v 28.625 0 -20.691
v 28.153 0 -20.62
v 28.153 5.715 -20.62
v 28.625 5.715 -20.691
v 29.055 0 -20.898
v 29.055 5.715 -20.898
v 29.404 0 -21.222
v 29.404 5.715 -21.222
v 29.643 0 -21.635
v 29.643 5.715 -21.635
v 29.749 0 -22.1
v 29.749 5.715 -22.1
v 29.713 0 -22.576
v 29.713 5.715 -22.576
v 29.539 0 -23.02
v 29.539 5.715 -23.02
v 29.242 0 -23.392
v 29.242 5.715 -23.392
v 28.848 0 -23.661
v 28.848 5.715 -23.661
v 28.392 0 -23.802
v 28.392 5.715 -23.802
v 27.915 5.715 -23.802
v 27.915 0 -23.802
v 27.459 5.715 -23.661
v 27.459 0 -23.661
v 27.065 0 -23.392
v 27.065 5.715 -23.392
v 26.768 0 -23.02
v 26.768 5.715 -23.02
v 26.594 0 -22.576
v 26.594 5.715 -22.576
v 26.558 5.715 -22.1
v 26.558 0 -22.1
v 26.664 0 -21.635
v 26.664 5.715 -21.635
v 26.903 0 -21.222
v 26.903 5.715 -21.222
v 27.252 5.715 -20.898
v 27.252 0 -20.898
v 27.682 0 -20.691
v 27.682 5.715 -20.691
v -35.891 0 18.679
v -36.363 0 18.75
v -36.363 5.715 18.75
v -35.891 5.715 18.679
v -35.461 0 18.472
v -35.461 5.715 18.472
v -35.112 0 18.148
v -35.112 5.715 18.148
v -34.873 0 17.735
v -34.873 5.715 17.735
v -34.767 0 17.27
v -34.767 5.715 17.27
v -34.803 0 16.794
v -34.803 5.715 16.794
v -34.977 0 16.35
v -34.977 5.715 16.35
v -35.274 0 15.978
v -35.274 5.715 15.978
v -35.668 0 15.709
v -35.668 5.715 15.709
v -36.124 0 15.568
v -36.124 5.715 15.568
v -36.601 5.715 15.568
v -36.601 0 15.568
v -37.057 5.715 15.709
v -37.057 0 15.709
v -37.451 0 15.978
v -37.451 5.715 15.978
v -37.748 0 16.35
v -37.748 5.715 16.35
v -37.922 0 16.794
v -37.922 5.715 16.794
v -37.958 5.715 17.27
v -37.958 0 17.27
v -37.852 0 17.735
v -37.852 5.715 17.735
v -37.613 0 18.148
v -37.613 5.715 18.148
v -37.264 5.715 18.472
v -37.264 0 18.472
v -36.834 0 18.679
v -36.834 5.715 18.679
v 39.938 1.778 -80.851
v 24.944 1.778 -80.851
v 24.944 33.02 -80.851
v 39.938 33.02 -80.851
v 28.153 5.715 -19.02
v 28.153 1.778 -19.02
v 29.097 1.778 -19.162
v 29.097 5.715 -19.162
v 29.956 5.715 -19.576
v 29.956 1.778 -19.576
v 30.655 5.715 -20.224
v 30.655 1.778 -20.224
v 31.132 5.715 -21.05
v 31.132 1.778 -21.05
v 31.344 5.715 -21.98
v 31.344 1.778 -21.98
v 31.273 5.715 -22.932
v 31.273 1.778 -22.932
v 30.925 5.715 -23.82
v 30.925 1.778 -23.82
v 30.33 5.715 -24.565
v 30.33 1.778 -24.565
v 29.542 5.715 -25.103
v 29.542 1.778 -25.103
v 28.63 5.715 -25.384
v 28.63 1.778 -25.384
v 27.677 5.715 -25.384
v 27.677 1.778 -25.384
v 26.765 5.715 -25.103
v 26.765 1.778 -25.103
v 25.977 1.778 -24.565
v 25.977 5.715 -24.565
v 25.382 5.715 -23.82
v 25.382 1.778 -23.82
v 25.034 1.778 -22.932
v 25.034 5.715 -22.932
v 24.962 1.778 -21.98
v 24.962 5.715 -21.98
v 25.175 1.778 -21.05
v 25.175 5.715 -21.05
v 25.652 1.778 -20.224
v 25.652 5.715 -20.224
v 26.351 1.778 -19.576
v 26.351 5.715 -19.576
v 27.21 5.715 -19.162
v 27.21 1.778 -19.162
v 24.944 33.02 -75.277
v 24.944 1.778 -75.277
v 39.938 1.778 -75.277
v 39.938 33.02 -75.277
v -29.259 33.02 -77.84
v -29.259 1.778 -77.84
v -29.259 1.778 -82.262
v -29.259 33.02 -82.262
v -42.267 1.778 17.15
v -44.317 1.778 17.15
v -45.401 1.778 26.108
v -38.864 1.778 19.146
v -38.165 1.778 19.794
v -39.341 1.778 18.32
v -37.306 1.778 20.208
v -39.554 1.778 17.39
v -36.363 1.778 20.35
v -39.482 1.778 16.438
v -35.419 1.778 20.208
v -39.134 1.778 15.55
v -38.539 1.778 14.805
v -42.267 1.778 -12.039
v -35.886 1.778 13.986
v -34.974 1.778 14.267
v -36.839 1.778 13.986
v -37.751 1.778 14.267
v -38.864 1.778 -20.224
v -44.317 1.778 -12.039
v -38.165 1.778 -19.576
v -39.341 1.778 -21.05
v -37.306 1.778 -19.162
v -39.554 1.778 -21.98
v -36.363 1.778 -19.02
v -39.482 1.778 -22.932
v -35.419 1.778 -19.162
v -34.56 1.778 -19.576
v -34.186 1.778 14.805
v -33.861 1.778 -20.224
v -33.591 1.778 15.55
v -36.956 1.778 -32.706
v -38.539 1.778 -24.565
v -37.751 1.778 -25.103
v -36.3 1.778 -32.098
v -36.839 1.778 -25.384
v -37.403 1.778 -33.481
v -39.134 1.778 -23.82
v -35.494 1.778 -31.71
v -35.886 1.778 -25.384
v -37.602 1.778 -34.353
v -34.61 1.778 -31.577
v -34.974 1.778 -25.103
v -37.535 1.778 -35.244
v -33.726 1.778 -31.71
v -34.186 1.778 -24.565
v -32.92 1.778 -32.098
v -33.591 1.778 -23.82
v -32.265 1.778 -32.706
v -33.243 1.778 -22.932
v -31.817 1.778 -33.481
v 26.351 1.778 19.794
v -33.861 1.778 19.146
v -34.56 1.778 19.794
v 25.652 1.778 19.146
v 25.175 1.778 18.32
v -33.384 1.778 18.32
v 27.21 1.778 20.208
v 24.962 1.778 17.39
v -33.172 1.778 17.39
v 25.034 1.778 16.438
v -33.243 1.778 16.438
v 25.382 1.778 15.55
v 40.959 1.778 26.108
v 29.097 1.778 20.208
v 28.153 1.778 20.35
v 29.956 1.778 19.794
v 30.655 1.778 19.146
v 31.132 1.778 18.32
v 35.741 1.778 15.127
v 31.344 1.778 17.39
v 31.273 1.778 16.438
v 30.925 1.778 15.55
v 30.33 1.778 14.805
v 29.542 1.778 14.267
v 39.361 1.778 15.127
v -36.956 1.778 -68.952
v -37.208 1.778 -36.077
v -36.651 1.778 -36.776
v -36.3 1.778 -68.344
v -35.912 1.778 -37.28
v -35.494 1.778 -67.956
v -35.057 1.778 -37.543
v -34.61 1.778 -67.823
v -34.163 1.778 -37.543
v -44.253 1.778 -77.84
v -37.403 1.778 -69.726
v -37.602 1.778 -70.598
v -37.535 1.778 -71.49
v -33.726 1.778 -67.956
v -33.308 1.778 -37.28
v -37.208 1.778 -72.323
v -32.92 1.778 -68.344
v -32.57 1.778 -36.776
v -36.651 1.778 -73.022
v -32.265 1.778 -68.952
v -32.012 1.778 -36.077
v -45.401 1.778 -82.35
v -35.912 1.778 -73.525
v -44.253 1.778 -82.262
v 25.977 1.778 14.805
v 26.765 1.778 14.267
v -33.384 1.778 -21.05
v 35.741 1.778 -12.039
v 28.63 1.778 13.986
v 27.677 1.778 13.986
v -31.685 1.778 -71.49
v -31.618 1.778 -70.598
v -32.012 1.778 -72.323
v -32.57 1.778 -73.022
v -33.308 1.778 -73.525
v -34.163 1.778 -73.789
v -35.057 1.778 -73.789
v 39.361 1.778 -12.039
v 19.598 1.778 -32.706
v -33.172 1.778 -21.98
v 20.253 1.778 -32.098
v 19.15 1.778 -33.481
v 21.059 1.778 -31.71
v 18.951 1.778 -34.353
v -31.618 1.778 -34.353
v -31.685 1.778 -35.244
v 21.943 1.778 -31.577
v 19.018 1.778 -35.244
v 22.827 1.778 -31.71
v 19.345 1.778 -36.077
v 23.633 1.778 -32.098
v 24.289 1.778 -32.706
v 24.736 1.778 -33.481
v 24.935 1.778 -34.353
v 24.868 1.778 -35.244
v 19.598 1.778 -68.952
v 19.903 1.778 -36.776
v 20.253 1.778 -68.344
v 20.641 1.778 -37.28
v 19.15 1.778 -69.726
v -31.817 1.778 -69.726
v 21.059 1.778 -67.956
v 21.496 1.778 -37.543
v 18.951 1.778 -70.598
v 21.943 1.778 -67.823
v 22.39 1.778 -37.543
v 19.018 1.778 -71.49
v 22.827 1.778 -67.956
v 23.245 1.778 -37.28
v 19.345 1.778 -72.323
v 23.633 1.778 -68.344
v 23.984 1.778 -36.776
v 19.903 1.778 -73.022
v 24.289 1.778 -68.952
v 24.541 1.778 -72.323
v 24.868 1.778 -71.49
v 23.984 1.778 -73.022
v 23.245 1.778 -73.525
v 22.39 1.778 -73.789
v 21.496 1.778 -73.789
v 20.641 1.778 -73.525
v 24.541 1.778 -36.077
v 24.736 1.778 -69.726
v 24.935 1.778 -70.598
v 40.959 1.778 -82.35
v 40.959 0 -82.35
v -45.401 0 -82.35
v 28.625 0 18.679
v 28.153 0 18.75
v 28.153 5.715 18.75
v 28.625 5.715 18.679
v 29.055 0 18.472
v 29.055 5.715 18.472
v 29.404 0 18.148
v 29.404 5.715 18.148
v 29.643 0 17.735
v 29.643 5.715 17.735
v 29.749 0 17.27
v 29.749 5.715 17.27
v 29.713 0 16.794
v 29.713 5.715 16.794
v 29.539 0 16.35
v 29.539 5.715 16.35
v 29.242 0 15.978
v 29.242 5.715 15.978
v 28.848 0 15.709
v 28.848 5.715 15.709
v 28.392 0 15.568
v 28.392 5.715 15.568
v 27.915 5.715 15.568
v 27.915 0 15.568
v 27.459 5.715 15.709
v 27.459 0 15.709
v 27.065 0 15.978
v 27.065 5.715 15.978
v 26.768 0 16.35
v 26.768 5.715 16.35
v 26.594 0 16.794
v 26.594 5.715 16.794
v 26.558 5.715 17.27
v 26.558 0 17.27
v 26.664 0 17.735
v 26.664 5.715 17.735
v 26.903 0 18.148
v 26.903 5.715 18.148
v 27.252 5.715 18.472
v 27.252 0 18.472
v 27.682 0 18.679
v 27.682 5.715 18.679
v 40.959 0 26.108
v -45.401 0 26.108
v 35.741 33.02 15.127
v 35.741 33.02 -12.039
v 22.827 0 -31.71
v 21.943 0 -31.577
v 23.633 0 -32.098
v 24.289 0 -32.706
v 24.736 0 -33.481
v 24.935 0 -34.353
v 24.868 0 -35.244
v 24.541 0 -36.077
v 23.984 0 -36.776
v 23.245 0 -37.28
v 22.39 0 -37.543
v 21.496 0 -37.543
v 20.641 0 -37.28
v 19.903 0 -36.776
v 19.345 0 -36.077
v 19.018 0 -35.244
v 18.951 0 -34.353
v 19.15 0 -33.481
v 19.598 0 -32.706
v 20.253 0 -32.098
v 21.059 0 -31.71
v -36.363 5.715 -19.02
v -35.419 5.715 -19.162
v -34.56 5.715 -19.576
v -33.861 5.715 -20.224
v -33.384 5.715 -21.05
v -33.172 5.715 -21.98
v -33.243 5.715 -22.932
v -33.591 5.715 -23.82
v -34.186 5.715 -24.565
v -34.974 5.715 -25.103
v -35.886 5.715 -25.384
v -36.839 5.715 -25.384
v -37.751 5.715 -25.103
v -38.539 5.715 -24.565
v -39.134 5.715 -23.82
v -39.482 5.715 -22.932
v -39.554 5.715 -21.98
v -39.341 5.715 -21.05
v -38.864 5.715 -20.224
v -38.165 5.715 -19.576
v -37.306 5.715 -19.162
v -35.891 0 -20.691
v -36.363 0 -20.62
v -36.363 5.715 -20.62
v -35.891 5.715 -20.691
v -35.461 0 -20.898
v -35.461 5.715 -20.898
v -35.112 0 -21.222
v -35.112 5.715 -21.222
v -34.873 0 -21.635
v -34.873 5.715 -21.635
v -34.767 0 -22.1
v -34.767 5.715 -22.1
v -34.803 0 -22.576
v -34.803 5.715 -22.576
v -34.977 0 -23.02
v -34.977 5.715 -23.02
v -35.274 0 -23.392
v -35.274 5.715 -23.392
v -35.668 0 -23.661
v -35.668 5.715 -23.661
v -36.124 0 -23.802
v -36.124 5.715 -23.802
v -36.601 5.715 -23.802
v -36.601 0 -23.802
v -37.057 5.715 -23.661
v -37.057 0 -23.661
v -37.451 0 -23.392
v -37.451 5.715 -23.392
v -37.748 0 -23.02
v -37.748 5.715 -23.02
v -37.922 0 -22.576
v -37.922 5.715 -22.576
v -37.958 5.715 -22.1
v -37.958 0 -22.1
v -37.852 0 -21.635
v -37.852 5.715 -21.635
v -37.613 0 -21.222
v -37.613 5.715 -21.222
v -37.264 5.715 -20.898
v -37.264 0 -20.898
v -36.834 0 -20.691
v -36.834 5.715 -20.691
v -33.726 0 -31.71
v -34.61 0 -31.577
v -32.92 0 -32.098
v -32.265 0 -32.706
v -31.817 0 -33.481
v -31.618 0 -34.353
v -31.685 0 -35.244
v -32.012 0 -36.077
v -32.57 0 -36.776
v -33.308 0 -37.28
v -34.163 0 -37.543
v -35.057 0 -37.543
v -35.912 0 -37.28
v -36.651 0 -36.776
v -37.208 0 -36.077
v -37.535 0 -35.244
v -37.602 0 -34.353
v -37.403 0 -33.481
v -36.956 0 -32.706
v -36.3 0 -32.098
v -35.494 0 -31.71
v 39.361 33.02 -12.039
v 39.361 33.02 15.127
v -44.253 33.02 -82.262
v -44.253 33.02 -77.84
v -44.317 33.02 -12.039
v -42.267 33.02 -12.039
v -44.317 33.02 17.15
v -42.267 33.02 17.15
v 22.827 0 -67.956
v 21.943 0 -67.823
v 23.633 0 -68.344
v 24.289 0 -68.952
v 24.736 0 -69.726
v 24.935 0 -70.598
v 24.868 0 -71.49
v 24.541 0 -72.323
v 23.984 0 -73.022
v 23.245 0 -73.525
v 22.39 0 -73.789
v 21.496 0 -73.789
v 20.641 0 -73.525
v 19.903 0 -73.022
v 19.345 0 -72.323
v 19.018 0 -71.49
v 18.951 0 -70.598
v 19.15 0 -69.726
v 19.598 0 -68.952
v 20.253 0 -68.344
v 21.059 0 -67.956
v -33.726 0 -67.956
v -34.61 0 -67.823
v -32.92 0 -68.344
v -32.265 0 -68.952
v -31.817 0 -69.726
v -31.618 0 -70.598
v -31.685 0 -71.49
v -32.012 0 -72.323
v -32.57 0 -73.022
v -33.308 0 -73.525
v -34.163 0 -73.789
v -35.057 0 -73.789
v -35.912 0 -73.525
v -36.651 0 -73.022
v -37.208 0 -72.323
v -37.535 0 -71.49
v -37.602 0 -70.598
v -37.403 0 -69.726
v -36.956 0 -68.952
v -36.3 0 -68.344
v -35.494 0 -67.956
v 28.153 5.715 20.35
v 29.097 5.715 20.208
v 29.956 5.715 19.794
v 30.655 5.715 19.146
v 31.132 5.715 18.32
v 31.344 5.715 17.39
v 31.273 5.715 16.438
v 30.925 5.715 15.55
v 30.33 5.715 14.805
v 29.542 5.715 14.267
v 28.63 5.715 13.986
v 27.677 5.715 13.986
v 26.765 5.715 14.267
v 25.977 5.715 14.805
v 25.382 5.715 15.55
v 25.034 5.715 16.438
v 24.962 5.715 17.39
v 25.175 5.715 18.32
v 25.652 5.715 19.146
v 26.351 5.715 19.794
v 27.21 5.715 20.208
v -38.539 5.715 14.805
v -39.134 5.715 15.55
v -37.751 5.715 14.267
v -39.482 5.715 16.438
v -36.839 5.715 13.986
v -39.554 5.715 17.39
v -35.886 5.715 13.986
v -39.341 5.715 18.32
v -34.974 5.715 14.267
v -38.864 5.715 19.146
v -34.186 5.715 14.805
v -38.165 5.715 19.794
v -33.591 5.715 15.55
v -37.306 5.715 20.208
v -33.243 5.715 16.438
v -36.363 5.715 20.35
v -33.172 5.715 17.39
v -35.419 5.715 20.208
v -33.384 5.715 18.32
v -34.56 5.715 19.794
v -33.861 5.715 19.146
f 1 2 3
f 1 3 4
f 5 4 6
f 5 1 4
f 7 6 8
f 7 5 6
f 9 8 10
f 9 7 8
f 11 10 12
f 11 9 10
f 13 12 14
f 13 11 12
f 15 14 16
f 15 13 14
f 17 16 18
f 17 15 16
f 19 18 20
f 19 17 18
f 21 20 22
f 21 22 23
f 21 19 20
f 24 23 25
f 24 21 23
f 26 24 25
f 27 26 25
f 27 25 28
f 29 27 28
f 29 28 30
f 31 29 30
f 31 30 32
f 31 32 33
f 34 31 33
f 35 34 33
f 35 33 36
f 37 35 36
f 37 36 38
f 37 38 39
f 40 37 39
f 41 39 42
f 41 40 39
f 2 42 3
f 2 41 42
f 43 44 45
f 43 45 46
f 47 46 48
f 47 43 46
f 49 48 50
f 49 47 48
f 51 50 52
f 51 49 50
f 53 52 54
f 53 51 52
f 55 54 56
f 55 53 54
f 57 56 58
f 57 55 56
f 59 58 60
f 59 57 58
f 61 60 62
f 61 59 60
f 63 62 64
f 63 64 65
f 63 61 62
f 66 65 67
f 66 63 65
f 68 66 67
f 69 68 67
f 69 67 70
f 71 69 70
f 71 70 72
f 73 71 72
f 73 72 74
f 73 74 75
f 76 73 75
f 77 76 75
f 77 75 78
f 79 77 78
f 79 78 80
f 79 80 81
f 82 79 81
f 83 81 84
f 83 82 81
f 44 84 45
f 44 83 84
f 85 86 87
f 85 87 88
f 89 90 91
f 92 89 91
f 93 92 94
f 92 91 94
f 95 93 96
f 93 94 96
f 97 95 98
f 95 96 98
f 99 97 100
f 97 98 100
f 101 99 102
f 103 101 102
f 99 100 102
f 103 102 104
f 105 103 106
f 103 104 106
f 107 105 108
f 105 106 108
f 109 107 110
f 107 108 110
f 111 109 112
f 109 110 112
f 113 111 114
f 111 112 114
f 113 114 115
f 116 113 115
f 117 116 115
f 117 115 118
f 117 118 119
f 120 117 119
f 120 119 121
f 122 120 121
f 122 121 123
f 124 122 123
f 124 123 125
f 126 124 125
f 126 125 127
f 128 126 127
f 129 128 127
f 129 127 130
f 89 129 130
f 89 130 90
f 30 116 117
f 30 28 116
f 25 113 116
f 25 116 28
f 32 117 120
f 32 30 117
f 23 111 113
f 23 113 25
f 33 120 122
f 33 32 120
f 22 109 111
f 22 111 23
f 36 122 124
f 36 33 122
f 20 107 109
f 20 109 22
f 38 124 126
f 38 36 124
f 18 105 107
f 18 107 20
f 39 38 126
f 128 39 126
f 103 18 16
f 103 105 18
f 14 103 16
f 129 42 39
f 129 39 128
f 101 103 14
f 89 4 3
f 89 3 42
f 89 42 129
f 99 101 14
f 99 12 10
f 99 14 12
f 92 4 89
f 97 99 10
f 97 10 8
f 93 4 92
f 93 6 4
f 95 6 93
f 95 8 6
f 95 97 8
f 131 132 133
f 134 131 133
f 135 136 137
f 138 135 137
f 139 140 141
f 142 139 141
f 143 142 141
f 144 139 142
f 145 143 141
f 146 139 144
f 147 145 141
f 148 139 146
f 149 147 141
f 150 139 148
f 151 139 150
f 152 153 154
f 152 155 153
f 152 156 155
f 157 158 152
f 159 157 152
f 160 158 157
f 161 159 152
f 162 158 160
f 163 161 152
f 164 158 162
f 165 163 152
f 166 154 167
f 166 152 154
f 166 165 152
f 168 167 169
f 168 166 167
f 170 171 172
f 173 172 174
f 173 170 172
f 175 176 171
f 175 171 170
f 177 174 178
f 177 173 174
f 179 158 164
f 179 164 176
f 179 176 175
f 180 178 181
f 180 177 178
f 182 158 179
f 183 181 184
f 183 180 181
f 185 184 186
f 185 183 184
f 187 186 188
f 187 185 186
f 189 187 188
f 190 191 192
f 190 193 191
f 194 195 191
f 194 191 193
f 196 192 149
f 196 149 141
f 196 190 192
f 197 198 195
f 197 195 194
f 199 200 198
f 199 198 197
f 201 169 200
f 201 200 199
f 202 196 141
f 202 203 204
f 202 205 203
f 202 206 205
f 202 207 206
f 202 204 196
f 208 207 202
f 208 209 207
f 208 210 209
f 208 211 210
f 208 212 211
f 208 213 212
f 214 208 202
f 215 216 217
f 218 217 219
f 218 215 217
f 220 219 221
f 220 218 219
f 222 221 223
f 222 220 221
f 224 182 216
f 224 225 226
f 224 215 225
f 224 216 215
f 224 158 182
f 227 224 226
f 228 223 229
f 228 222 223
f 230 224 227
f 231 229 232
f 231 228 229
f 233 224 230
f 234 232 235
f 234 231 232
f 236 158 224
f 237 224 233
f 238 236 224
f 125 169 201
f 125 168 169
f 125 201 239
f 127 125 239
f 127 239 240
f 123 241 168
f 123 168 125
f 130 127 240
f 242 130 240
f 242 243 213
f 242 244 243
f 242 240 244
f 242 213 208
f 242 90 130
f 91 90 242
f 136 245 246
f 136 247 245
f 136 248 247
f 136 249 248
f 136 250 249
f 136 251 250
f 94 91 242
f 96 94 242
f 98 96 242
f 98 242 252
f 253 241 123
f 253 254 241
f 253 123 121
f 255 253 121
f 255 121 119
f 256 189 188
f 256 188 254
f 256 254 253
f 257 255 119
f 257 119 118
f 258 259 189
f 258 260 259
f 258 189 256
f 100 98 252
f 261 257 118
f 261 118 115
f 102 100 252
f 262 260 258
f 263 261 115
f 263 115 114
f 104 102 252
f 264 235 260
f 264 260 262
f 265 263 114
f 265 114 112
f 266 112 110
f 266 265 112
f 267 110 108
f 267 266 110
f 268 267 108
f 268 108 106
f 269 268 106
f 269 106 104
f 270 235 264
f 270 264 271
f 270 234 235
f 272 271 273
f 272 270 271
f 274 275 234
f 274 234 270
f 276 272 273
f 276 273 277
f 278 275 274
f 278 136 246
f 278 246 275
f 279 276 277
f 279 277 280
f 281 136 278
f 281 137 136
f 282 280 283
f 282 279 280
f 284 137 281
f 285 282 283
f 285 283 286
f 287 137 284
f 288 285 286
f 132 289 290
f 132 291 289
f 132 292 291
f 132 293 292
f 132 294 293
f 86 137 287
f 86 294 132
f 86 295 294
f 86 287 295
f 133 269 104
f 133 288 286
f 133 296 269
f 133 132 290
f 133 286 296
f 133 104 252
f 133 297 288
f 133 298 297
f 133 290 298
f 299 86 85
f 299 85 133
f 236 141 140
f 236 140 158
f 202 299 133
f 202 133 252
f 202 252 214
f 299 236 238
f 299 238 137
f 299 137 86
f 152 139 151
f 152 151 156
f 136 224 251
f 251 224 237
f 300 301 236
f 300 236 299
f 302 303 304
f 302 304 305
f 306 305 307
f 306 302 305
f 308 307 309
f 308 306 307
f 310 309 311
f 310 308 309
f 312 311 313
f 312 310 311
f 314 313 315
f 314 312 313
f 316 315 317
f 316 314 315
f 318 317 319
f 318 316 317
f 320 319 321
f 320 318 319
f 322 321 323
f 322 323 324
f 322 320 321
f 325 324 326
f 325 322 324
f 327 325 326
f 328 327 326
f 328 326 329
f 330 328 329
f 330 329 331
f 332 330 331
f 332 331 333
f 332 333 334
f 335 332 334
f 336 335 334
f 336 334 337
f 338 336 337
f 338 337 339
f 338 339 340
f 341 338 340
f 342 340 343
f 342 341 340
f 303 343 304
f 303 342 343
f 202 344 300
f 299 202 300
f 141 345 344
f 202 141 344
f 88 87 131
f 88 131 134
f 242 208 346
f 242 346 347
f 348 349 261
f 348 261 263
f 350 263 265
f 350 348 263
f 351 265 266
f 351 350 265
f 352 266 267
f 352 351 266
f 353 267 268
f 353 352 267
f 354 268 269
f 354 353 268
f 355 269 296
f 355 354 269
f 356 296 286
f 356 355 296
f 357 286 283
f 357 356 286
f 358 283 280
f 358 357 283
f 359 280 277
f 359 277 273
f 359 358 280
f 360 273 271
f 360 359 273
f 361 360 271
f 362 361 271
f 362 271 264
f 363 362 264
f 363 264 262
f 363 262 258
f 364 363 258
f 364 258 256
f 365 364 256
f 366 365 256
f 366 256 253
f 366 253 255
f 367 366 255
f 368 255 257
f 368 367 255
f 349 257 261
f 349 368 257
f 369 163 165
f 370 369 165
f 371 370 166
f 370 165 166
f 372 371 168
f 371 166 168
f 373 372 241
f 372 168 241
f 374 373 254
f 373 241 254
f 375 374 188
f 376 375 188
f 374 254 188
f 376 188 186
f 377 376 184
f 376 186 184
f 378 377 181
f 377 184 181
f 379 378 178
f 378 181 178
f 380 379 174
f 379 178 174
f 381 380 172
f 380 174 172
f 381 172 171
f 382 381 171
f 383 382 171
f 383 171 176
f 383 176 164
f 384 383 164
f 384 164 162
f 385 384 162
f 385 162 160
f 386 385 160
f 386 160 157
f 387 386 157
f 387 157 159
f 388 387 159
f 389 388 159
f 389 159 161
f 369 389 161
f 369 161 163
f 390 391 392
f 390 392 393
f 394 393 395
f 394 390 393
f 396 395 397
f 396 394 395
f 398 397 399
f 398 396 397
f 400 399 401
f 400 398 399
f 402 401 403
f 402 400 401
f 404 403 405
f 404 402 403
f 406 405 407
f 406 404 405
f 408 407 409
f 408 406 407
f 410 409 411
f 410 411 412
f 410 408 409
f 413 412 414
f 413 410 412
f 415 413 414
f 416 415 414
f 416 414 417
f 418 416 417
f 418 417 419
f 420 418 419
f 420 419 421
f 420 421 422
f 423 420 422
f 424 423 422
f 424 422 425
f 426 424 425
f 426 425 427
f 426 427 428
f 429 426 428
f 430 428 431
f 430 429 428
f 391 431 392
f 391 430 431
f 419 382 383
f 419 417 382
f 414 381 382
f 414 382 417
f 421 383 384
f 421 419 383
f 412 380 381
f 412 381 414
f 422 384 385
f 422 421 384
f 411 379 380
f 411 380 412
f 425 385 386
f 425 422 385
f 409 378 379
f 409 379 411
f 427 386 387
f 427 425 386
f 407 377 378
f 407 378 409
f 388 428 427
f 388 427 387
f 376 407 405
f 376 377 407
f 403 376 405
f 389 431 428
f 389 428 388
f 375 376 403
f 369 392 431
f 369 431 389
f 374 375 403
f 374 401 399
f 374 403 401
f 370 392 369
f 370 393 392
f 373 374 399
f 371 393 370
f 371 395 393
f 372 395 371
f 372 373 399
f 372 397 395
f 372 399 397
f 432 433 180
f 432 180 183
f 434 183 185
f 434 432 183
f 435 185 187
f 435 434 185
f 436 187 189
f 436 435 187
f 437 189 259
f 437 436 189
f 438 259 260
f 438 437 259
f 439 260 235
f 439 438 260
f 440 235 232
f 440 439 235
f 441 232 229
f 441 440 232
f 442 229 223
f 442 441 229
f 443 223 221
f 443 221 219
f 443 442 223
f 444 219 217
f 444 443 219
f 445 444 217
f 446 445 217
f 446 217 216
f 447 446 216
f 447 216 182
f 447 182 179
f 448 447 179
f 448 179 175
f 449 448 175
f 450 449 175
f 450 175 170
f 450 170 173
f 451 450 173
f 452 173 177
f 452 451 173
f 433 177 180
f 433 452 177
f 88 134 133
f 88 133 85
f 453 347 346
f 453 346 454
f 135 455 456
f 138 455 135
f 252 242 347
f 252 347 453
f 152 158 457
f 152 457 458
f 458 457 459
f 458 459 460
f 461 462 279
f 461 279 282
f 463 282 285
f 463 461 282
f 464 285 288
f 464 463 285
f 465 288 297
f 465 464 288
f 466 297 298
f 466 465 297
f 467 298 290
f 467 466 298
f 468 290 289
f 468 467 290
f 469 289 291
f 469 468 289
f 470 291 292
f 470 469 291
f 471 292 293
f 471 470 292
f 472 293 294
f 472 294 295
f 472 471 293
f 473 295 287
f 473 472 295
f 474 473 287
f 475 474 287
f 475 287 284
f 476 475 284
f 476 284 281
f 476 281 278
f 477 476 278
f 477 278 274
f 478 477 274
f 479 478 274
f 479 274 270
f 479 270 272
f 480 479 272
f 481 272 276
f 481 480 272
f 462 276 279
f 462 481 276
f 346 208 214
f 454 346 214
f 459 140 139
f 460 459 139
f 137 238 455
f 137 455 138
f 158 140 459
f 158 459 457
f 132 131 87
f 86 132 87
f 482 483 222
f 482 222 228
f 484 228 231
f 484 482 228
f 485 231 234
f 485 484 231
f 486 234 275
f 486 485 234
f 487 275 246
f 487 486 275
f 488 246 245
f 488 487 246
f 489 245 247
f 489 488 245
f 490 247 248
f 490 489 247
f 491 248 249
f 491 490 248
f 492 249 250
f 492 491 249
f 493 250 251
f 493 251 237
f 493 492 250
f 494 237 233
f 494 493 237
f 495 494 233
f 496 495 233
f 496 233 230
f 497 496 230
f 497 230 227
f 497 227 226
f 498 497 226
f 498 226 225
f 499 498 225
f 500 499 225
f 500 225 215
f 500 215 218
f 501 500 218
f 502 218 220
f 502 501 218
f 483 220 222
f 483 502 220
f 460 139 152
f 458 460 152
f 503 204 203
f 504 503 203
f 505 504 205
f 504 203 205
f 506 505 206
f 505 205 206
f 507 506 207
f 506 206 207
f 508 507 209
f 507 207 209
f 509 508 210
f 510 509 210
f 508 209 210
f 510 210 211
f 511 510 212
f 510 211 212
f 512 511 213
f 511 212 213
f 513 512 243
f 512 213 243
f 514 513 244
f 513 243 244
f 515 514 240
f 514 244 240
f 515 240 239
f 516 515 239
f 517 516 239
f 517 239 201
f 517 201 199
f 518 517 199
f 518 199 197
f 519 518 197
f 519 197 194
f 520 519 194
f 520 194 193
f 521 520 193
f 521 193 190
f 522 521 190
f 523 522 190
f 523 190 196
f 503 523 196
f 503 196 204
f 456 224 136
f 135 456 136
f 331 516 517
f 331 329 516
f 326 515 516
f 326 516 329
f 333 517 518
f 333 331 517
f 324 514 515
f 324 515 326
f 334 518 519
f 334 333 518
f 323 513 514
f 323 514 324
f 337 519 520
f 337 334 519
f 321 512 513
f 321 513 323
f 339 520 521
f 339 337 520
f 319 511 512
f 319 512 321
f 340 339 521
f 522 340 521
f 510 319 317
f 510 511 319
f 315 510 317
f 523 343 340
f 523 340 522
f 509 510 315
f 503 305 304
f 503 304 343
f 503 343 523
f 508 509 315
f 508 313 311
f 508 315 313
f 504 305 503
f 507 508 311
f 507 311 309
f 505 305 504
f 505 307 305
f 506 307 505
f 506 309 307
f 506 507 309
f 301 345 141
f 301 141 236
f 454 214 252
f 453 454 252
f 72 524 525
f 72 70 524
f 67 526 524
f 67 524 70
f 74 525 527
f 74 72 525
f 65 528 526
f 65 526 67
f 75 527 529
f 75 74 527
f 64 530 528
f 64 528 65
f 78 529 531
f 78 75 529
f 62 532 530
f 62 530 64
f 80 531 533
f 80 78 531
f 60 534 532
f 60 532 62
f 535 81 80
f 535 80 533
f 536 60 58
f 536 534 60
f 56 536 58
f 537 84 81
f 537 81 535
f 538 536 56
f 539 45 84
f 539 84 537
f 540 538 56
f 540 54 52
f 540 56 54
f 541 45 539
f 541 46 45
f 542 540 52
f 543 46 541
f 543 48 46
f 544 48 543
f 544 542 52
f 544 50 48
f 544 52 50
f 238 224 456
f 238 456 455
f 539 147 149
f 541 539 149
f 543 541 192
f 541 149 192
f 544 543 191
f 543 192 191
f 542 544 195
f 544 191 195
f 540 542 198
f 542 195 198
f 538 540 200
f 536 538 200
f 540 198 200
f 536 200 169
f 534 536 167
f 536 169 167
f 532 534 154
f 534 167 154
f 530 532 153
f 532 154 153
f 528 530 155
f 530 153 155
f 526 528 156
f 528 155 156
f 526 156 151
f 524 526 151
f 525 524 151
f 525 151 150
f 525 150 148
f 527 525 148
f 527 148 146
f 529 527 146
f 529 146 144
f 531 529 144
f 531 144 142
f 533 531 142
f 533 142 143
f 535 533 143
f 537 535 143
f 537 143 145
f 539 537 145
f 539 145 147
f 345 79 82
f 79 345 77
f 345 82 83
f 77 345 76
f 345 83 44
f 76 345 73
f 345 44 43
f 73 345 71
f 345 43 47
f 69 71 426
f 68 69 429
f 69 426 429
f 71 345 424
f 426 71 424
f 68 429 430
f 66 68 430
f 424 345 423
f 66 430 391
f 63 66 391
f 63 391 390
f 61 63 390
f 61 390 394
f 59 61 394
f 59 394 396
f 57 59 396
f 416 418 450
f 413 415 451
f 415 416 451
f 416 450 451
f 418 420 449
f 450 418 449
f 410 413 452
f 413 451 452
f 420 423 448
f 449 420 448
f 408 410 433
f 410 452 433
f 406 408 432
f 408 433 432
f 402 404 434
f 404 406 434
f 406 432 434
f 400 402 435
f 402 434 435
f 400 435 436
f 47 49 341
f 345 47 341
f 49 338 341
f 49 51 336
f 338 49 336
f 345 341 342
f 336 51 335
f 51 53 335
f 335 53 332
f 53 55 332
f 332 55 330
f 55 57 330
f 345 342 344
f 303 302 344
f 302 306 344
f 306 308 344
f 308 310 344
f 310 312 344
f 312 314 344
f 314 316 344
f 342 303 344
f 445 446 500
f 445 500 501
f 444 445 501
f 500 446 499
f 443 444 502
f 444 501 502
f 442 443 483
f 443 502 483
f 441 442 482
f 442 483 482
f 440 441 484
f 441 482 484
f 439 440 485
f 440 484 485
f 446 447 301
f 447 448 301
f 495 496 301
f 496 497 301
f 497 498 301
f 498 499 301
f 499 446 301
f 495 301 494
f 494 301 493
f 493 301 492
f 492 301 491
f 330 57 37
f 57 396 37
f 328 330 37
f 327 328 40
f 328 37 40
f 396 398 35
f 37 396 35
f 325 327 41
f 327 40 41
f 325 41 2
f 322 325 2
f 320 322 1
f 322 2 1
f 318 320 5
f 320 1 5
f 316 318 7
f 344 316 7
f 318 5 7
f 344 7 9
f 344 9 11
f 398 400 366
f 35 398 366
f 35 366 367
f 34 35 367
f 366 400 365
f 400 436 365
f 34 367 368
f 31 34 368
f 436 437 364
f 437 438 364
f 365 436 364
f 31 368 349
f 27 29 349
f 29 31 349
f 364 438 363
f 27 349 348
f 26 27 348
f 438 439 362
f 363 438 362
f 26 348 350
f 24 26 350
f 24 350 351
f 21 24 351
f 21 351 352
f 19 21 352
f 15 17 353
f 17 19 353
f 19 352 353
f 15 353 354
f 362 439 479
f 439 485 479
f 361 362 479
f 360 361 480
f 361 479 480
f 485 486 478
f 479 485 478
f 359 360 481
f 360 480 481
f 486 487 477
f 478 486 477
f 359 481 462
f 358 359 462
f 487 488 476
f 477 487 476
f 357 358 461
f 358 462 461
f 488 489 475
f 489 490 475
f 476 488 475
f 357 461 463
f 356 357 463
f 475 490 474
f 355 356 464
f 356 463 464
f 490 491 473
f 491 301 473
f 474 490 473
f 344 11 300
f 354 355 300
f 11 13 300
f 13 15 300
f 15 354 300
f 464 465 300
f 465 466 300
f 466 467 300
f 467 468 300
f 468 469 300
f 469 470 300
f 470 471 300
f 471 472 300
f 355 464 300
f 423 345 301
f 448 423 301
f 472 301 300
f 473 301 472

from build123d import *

# Parameters (mm, degrees)
SKETCH1_W           = 86.36
SKETCH1_H           = 108.458
SKETCH1_R           = 3.2
SKETCH1_W_2         = 2.05031229
SKETCH1_H_2         = 29.189687669
SKETCH1_W_3         = 3.620082636
SKETCH1_H_3         = 27.166637837
SKETCH1_R_2         = 3
SKETCH1_W_4         = 14.993601523
SKETCH1_H_4         = 4.4218346
SKETCH1_W_5         = 14.993536873
SKETCH1_H_5         = 5.57414232
BOSS_EXTRUDE1_DEPTH = 1.778
SKETCH1_4_R         = 3.2
SKETCH1_4_R_2       = 1.6
BOSS_EXTRUDE2_DEPTH = 5.715
SKETCH1_5_W         = 14.993601523
SKETCH1_5_H         = 4.4218346
SKETCH1_5_W_2       = 14.993536873
SKETCH1_5_H_2       = 5.57414232
SKETCH1_5_W_3       = 3.620082636
SKETCH1_5_H_3       = 27.166637837
SKETCH1_5_W_4       = 2.05031229
SKETCH1_5_H_4       = 29.189687669
BOSS_EXTRUDE3_DEPTH = 33.02


with BuildPart() as part:
    # Sketch1 → Boss-Extrude1 (new body)
    with BuildSketch(Plane(origin=(0, 0, 0), x_dir=(1, 0, 0), z_dir=(0, 1, 0))):
        with Locations((-2.221461279, 28.121370378)):
            Rectangle(SKETCH1_W, SKETCH1_H)
        with Locations((-36.36256187, -17.150480836)):
            Circle(SKETCH1_R, mode=Mode.SUBTRACT)
        with Locations((-43.291771042, -2.555637001)):
            Rectangle(SKETCH1_W_2, SKETCH1_H_2, mode=Mode.SUBTRACT)
        with Locations((-36.36256187, 22.219519164)):
            Circle(SKETCH1_R, mode=Mode.SUBTRACT)
        with Locations((28.15343813, -17.150480836)):
            Circle(SKETCH1_R, mode=Mode.SUBTRACT)
        with Locations((37.551401815, -1.544112086)):
            Rectangle(SKETCH1_W_3, SKETCH1_H_3, mode=Mode.SUBTRACT)
        with Locations((28.15343813, 22.219519164)):
            Circle(SKETCH1_R, mode=Mode.SUBTRACT)
        with Locations((-34.610055164, 34.576719266)):
            Circle(SKETCH1_R_2, mode=Mode.SUBTRACT)
        with Locations((-34.610055164, 70.822519266)):
            Circle(SKETCH1_R_2, mode=Mode.SUBTRACT)
        with Locations((-36.756055824, 80.051074351)):
            Rectangle(SKETCH1_W_4, SKETCH1_H_4, mode=Mode.SUBTRACT)
        with Locations((21.943044836, 34.576719266)):
            Circle(SKETCH1_R_2, mode=Mode.SUBTRACT)
        with Locations((21.943044836, 70.822519266)):
            Circle(SKETCH1_R_2, mode=Mode.SUBTRACT)
        with Locations((32.441242145, 78.064404156)):
            Rectangle(SKETCH1_W_5, SKETCH1_H_5, mode=Mode.SUBTRACT)
    extrude(amount=BOSS_EXTRUDE1_DEPTH)

    # Sketch1<4> → Boss-Extrude2 (add)
    # profile 1 of 4: a face of its own
    with BuildSketch(Plane(origin=(0, 0, 0), x_dir=(1, 0, 0), z_dir=(0, 1, 0))):
        with Locations((-36.36256187, 22.219519164)):
            Circle(SKETCH1_4_R)
        with Locations((-36.36256187, 22.219519164)):
            Circle(SKETCH1_4_R_2, mode=Mode.SUBTRACT)
    # profile 2 of 4: a face of its own
    with BuildSketch(Plane(origin=(0, 0, 0), x_dir=(1, 0, 0), z_dir=(0, 1, 0))):
        with Locations((28.15343813, 22.219519164)):
            Circle(SKETCH1_4_R)
        with Locations((28.15343813, 22.219519164)):
            Circle(SKETCH1_4_R_2, mode=Mode.SUBTRACT)
    # profile 3 of 4: a face of its own
    with BuildSketch(Plane(origin=(0, 0, 0), x_dir=(1, 0, 0), z_dir=(0, 1, 0))):
        with Locations((-36.36256187, -17.150480836)):
            Circle(SKETCH1_4_R)
        with Locations((-36.36256187, -17.150480836)):
            Circle(SKETCH1_4_R_2, mode=Mode.SUBTRACT)
    # profile 4 of 4: a face of its own
    with BuildSketch(Plane(origin=(0, 0, 0), x_dir=(1, 0, 0), z_dir=(0, 1, 0))):
        with Locations((28.15343813, -17.150480836)):
            Circle(SKETCH1_4_R)
        with Locations((28.15343813, -17.150480836)):
            Circle(SKETCH1_4_R_2, mode=Mode.SUBTRACT)
    extrude(amount=BOSS_EXTRUDE2_DEPTH)

    # Sketch1<5> → Boss-Extrude3 (add)
    with BuildSketch(Plane(origin=(0, 0, 0), x_dir=(1, 0, 0), z_dir=(0, 1, 0))):
        with Locations((-36.756055824, 80.051074351)):
            Rectangle(SKETCH1_5_W, SKETCH1_5_H)
        with Locations((32.441242145, 78.064404156)):
            Rectangle(SKETCH1_5_W_2, SKETCH1_5_H_2)
        with Locations((37.551401815, -1.544112086)):
            Rectangle(SKETCH1_5_W_3, SKETCH1_5_H_3)
        with Locations((-43.291771042, -2.555637001)):
            Rectangle(SKETCH1_5_W_4, SKETCH1_5_H_4)
    extrude(amount=BOSS_EXTRUDE3_DEPTH)


solid = part.part
